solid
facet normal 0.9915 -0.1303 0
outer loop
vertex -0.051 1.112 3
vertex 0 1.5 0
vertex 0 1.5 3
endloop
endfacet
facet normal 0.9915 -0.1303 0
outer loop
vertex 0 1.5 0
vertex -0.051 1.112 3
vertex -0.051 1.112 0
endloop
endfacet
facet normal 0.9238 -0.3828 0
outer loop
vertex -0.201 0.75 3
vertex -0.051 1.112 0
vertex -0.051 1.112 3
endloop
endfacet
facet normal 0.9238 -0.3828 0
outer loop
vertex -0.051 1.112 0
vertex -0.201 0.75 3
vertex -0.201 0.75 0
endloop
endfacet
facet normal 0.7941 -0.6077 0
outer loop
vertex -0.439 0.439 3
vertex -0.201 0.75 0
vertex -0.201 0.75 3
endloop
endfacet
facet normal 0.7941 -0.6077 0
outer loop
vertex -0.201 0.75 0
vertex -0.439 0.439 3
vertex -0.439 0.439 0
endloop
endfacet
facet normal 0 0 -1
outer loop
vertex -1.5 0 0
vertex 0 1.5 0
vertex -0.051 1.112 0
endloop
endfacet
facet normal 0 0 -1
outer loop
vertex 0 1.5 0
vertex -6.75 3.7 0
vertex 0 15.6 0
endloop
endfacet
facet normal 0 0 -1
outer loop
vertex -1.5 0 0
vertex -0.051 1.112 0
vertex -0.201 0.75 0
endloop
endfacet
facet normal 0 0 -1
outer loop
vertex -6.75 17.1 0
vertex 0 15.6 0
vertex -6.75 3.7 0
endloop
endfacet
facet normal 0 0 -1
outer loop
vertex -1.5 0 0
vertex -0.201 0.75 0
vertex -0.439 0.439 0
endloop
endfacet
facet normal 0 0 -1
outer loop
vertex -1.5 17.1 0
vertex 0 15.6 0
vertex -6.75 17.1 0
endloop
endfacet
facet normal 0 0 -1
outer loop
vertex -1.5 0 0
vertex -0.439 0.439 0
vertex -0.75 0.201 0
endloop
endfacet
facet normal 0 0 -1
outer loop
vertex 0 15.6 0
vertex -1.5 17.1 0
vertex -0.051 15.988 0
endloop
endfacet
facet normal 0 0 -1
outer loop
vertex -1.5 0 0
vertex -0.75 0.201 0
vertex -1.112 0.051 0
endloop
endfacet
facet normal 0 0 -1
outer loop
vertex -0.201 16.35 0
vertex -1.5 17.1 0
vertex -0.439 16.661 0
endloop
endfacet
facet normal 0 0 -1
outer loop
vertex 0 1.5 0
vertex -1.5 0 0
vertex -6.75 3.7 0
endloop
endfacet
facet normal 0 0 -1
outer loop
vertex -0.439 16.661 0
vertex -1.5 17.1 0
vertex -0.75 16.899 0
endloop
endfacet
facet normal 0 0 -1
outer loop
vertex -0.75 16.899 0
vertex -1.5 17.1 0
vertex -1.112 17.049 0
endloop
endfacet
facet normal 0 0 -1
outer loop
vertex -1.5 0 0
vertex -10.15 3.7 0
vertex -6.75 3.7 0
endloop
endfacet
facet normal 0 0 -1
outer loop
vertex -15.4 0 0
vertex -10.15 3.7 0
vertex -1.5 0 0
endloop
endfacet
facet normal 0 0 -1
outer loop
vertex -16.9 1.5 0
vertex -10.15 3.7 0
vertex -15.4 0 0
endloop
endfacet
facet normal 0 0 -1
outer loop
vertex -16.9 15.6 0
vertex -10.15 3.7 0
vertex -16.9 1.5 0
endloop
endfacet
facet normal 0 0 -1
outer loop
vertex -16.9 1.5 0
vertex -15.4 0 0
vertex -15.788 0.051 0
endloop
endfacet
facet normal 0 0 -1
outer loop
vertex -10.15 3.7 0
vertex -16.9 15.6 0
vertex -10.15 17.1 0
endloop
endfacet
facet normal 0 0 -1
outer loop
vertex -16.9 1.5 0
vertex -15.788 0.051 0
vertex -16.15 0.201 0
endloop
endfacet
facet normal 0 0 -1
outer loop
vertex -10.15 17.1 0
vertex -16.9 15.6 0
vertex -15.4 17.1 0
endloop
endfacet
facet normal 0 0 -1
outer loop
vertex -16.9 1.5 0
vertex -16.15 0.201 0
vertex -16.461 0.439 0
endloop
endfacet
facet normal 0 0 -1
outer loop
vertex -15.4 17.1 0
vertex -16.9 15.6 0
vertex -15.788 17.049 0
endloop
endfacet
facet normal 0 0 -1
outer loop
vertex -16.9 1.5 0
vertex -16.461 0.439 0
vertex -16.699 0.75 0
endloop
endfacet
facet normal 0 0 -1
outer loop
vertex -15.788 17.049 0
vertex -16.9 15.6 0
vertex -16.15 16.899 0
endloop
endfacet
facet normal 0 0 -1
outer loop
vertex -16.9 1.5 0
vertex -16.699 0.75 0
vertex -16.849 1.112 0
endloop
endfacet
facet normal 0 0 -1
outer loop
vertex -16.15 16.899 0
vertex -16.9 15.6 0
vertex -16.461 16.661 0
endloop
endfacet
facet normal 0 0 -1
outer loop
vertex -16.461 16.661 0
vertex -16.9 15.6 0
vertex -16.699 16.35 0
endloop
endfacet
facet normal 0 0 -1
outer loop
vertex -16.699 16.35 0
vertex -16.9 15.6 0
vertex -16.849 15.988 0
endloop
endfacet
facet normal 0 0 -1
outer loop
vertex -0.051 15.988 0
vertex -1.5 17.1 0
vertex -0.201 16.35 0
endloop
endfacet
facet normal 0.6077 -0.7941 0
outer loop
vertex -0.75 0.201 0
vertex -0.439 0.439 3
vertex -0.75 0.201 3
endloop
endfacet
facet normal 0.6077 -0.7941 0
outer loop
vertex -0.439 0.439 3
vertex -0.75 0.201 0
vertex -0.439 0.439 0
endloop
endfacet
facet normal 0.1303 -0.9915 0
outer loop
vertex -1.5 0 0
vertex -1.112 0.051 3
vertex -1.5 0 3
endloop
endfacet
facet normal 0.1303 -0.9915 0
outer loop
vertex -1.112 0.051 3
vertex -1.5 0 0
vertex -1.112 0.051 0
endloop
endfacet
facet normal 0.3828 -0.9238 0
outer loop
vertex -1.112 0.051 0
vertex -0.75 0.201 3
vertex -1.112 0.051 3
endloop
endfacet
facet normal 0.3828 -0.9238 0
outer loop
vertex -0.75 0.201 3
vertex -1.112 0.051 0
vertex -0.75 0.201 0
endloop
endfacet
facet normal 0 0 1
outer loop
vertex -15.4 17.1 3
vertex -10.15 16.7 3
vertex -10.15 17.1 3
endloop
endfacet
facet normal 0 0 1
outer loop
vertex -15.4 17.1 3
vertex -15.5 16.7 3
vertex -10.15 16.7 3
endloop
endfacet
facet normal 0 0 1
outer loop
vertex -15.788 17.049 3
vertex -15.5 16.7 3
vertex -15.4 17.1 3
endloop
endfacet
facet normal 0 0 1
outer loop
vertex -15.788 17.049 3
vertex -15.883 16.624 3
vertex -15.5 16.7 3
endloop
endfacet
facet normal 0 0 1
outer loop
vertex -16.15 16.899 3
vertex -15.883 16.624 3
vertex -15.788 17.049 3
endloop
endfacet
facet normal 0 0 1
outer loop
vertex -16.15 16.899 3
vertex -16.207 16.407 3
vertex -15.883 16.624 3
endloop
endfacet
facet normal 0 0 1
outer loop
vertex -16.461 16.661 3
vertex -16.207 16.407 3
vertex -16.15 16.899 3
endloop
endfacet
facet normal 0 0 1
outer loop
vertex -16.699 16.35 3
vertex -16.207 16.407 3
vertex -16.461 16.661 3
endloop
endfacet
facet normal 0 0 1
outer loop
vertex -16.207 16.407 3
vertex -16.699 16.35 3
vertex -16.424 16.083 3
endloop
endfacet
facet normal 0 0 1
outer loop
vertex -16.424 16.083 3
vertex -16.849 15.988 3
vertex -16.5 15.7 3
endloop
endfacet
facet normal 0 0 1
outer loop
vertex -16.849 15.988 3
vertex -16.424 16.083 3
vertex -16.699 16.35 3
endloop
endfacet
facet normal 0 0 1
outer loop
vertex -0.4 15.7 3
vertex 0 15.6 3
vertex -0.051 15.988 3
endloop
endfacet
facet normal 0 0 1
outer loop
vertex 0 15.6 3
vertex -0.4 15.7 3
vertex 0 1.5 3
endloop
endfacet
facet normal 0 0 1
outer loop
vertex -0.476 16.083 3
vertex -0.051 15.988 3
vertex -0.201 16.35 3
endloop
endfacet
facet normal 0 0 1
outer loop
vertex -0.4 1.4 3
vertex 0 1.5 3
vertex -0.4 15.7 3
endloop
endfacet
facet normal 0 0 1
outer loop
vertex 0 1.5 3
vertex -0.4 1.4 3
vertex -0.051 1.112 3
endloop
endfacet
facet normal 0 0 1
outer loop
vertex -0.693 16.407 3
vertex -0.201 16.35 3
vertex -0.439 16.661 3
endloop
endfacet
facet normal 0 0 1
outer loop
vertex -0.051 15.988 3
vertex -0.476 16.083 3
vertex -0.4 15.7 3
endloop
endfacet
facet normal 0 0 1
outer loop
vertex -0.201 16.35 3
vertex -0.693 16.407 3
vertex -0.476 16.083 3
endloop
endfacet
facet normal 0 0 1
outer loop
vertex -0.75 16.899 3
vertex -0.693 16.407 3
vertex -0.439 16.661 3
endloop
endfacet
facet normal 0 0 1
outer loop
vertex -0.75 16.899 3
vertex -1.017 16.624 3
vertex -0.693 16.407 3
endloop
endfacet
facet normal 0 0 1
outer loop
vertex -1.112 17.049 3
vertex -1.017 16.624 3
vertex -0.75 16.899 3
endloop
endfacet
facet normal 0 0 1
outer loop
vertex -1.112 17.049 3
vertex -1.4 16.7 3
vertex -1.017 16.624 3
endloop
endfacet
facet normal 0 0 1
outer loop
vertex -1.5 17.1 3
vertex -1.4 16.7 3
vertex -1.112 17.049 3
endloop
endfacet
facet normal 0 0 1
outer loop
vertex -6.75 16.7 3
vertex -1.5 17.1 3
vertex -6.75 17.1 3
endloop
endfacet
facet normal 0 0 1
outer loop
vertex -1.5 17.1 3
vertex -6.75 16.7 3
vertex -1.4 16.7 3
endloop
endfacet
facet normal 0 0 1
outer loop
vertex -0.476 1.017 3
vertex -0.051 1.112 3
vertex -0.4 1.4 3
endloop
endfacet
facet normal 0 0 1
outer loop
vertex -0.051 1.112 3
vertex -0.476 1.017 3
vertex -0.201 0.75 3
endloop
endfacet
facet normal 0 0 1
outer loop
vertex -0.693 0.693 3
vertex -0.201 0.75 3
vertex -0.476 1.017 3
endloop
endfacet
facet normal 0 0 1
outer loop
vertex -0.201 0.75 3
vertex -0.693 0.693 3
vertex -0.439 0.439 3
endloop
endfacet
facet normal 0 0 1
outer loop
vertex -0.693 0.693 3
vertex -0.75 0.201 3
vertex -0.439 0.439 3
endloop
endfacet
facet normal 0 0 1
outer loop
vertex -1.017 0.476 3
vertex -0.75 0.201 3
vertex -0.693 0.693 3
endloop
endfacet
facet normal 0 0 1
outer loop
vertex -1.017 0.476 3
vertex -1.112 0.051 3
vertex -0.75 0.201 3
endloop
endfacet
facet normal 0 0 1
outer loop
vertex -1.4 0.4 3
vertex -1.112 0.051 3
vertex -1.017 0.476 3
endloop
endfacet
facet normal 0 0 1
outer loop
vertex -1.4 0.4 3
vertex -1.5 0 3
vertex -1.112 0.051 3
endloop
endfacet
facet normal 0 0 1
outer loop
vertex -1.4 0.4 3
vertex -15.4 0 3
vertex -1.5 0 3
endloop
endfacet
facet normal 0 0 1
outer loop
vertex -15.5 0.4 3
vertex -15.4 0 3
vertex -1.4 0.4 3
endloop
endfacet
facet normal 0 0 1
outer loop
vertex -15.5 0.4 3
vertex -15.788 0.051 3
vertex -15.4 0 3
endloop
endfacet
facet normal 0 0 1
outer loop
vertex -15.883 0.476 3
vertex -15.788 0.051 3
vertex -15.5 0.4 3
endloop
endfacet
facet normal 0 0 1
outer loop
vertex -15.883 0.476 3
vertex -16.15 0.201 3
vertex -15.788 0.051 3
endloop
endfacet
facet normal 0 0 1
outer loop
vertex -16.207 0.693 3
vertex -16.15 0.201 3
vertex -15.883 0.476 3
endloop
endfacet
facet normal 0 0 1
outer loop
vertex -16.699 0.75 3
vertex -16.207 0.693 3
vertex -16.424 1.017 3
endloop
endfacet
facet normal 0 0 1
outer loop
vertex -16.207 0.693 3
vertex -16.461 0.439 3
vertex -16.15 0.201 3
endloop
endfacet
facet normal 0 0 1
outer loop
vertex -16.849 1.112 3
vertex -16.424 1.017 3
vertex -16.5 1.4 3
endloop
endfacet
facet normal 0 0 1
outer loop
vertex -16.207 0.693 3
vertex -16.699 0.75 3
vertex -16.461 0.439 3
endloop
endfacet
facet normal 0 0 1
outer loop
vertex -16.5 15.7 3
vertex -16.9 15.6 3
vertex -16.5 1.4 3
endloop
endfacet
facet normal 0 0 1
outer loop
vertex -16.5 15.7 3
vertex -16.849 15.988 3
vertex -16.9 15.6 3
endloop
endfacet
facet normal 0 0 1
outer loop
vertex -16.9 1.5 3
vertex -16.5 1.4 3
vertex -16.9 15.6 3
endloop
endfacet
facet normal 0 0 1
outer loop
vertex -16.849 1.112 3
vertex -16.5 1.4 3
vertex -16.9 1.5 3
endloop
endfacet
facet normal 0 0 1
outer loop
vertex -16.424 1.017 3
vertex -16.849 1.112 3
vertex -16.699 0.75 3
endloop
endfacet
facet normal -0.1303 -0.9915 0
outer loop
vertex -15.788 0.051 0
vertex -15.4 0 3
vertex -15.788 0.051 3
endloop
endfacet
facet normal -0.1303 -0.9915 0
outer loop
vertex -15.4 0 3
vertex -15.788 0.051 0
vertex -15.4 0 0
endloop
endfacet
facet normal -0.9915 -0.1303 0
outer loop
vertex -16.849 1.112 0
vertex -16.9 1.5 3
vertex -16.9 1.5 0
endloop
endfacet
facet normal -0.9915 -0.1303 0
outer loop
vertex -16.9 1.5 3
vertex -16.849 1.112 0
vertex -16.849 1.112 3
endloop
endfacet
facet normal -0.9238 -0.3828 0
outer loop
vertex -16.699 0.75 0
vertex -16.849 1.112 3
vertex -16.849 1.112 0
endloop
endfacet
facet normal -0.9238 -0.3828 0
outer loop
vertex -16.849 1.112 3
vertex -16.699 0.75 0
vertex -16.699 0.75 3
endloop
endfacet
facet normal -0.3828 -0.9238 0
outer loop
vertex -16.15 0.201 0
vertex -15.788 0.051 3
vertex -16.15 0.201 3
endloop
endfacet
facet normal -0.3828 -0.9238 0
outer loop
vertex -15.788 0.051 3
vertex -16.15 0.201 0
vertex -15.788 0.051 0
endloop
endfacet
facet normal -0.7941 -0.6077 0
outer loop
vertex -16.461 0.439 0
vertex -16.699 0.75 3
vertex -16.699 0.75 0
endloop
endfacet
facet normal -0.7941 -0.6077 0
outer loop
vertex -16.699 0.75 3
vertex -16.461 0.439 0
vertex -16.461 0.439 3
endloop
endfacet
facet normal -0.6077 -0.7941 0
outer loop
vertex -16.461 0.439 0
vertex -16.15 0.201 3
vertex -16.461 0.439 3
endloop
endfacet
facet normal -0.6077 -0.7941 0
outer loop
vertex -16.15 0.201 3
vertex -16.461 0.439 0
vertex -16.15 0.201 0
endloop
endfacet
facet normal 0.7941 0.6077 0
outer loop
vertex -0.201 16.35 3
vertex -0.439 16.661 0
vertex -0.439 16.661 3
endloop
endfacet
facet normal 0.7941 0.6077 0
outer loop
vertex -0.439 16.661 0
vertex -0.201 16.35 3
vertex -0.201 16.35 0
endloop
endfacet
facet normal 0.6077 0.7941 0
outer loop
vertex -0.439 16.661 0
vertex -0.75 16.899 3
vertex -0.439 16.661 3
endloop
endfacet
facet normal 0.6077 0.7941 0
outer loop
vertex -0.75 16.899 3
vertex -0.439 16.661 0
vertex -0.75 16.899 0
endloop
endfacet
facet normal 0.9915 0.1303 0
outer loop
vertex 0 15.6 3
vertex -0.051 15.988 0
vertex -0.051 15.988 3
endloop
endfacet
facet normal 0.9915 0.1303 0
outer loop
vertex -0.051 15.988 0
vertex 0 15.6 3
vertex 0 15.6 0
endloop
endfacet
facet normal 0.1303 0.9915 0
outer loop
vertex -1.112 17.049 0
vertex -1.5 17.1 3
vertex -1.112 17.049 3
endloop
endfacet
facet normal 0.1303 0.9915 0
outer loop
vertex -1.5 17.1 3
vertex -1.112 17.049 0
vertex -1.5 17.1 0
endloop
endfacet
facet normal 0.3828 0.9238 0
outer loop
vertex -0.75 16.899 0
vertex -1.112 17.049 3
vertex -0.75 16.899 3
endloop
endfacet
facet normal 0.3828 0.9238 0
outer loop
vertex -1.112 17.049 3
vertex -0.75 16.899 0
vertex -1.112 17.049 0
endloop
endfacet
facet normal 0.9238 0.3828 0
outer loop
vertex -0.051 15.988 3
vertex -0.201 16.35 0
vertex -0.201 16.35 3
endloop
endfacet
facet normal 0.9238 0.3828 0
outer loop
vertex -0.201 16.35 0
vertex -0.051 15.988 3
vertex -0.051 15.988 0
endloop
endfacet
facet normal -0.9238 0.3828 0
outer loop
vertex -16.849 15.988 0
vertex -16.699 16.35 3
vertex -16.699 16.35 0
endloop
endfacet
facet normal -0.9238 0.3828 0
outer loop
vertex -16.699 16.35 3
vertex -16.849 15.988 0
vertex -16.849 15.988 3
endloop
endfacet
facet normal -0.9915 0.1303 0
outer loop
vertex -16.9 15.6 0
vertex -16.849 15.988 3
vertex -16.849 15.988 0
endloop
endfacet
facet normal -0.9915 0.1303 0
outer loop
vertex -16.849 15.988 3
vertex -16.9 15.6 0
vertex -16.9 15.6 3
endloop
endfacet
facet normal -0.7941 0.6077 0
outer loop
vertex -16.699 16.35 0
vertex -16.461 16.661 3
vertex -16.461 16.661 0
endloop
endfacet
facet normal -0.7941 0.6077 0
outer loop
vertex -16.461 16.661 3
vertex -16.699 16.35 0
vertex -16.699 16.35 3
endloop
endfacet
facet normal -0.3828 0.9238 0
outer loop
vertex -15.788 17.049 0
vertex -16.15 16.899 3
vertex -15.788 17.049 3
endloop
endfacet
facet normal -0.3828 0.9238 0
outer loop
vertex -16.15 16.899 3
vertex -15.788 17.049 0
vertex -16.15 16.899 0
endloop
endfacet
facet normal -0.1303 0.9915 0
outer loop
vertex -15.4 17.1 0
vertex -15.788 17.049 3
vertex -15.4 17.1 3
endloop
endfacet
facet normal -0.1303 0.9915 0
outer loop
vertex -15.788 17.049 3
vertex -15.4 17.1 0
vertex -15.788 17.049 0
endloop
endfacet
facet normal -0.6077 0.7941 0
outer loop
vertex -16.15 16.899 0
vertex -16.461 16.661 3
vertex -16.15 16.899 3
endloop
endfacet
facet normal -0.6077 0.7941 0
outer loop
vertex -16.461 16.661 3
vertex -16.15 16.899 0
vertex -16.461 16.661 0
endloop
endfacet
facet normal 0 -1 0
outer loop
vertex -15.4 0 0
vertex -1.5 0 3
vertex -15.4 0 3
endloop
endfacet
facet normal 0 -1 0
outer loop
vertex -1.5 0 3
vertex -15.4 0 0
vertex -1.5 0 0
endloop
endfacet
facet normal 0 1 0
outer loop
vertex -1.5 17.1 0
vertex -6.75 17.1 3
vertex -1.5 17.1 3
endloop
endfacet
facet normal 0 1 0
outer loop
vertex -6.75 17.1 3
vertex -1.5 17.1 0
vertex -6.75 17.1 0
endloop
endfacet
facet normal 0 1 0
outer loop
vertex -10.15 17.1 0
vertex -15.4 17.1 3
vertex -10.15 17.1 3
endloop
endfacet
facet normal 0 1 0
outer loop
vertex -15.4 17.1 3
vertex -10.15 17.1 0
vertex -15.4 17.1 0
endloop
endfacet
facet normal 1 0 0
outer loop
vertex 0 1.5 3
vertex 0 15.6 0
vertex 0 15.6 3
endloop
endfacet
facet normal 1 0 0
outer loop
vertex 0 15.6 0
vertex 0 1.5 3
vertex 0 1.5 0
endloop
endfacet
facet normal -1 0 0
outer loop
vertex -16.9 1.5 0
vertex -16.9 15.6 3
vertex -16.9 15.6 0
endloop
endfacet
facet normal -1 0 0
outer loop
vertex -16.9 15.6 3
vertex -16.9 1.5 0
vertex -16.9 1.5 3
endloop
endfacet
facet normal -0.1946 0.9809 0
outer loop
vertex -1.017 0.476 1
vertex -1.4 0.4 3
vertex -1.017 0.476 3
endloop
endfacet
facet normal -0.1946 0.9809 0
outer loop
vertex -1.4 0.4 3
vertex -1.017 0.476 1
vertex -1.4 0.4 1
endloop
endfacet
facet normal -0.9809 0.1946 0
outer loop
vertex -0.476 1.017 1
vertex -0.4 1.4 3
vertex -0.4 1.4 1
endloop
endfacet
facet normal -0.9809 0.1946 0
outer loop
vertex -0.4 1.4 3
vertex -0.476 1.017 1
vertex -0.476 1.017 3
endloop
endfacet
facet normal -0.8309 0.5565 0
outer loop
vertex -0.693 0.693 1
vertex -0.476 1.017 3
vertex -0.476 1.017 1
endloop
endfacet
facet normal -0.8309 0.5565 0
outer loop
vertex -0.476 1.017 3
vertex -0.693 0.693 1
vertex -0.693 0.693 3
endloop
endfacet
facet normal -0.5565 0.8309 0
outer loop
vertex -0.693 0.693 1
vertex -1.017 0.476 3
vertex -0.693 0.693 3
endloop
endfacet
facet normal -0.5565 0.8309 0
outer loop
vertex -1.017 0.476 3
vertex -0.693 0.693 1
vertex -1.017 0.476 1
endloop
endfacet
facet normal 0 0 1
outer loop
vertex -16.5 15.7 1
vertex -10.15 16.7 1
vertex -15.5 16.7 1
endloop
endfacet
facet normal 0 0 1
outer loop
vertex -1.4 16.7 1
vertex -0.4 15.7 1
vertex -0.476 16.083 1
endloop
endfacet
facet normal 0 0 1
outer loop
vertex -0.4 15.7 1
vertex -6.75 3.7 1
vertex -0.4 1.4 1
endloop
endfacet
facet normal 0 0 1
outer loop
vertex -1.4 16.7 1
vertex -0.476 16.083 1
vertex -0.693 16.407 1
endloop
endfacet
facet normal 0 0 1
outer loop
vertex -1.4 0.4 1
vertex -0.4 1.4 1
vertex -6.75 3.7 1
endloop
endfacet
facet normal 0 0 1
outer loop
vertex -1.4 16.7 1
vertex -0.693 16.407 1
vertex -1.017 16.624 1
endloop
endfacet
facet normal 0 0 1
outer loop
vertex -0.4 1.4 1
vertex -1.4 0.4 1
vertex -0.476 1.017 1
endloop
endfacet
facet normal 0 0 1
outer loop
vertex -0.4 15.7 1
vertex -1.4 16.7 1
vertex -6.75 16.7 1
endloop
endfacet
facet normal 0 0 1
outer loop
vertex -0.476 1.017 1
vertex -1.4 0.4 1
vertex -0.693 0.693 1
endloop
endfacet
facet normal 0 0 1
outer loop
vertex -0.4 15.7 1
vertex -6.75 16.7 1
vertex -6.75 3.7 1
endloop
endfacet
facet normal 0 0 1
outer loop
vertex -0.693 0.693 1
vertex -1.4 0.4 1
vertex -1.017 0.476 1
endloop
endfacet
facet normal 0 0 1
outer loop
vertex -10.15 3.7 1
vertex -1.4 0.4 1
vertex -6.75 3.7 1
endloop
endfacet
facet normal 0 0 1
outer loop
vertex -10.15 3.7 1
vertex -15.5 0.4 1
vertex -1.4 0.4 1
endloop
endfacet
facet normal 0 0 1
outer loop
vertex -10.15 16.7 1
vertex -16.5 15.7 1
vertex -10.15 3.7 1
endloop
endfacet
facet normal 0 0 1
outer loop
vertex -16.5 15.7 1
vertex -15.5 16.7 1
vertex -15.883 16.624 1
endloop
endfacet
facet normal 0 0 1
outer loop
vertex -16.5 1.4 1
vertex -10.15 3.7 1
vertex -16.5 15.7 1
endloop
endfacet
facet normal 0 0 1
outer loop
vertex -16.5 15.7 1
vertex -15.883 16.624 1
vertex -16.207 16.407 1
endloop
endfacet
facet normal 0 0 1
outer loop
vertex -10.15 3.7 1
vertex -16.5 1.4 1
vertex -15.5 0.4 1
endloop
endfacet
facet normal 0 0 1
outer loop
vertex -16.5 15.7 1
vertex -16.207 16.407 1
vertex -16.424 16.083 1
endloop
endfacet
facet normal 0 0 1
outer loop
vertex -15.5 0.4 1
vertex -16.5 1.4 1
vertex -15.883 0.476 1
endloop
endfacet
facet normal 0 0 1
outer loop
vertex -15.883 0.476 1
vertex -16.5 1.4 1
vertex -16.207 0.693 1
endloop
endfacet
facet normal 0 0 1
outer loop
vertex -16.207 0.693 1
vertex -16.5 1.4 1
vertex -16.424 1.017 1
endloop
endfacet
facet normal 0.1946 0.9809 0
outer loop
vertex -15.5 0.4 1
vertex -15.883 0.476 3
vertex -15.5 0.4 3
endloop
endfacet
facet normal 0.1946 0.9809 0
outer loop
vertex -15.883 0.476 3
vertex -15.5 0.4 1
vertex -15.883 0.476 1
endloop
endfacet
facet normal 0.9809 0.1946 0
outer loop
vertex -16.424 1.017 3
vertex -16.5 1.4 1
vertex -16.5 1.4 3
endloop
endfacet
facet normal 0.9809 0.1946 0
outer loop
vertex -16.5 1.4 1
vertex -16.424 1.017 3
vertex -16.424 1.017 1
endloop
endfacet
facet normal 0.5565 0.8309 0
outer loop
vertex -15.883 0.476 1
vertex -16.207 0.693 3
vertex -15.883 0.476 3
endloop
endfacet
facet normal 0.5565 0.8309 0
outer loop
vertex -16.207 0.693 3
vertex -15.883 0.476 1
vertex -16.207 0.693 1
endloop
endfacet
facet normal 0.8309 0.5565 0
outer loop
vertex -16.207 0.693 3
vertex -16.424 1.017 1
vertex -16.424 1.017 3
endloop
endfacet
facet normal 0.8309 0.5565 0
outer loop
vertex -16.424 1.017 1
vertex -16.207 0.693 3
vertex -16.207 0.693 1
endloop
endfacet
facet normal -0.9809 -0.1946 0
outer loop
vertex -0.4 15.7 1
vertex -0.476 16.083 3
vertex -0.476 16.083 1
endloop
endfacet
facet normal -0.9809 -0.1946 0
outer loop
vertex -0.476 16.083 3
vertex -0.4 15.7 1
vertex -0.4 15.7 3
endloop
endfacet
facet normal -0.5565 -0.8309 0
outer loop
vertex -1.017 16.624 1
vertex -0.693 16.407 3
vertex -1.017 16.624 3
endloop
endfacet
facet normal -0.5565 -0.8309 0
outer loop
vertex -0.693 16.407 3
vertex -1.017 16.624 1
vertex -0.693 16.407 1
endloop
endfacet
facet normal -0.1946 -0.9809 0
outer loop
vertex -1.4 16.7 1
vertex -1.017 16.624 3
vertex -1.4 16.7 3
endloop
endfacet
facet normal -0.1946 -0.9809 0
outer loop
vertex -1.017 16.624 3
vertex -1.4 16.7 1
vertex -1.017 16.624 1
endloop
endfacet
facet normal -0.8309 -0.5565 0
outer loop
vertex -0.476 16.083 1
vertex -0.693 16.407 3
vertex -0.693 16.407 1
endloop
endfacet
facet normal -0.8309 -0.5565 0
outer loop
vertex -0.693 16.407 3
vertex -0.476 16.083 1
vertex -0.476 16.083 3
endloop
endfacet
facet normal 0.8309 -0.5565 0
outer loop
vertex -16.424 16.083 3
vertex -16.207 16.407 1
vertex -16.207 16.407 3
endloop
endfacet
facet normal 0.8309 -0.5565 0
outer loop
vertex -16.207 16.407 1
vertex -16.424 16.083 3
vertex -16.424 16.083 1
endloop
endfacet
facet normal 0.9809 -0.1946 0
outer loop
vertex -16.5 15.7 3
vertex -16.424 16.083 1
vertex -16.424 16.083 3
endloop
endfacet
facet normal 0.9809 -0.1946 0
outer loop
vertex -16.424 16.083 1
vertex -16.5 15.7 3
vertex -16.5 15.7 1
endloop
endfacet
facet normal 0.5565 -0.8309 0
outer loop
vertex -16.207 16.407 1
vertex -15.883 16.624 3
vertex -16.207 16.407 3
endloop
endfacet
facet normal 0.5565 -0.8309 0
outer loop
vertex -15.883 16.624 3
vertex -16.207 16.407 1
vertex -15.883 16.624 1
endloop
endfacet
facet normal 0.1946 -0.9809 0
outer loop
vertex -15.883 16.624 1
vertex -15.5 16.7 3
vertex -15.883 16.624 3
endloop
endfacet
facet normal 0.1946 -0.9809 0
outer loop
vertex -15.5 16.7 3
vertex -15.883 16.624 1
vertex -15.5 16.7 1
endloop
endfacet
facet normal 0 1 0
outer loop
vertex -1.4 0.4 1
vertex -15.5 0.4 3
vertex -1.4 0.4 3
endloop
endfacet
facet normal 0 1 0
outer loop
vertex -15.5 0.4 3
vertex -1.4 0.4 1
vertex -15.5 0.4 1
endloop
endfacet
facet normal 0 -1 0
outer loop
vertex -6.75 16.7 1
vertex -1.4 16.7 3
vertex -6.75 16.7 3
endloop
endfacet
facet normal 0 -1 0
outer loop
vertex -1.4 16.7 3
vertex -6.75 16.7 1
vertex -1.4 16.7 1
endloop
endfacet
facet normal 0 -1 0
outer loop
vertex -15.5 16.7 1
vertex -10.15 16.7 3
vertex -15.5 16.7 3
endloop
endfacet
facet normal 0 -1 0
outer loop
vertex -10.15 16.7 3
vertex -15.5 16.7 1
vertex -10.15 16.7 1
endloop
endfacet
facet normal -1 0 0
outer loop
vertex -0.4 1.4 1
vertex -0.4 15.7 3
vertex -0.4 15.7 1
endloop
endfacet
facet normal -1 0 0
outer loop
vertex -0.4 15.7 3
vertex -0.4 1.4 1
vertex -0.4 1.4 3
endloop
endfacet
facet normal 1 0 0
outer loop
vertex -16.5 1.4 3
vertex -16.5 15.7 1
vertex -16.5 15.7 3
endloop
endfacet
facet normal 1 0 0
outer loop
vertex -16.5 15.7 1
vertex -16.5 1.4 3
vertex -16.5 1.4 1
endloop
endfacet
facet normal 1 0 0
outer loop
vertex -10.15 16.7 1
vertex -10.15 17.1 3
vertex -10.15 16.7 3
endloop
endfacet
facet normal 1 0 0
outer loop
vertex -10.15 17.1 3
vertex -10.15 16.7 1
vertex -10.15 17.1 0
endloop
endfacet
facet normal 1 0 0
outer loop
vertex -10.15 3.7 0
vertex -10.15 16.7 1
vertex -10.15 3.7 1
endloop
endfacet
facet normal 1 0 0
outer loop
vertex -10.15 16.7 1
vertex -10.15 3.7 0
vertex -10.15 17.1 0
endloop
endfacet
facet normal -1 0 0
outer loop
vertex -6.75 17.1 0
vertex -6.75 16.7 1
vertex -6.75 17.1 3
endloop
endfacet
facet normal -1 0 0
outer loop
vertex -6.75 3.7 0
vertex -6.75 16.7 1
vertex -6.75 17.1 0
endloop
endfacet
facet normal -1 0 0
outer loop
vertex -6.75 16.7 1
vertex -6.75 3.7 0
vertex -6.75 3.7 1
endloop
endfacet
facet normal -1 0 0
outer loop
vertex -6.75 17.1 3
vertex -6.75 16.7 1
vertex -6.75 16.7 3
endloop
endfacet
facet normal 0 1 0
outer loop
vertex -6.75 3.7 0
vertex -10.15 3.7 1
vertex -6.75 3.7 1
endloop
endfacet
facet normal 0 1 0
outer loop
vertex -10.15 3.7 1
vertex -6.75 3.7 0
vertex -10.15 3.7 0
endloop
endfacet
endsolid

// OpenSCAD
$fa = 2;    // minimum angle (fine resolution)
$fs = 0.4;  // minimum size (fine resolution)

use <drawer.scad>  // reusable primitives

epsilon = 0.001;   // help avoid issues with floating-point rounding error

thickness = 3.0;

base = [ 15.7, 15.9,  thickness ];

slop = 0.2; // slop around each edge

overhang = 0.6;

block = [ base.x + 2 * overhang, base.y + 2 * overhang, base.z ];


translate([0, 0, block.z])
rotate([0.0, 180, 0])
difference () {
  cube_filleted_columns(block, 1.5);
  translate([overhang - slop, overhang - slop, -1])
    cube_filleted_columns([base.x + 2 * slop, base.y + 2 * slop, base.z], 1);
  translate([block.x / 2.0 - thickness / 2.0 - slop, (block.y - 9.7) / 2.0, -epsilon])
    cube([thickness + 2 * slop, block.y, 2*block.z]);
}
